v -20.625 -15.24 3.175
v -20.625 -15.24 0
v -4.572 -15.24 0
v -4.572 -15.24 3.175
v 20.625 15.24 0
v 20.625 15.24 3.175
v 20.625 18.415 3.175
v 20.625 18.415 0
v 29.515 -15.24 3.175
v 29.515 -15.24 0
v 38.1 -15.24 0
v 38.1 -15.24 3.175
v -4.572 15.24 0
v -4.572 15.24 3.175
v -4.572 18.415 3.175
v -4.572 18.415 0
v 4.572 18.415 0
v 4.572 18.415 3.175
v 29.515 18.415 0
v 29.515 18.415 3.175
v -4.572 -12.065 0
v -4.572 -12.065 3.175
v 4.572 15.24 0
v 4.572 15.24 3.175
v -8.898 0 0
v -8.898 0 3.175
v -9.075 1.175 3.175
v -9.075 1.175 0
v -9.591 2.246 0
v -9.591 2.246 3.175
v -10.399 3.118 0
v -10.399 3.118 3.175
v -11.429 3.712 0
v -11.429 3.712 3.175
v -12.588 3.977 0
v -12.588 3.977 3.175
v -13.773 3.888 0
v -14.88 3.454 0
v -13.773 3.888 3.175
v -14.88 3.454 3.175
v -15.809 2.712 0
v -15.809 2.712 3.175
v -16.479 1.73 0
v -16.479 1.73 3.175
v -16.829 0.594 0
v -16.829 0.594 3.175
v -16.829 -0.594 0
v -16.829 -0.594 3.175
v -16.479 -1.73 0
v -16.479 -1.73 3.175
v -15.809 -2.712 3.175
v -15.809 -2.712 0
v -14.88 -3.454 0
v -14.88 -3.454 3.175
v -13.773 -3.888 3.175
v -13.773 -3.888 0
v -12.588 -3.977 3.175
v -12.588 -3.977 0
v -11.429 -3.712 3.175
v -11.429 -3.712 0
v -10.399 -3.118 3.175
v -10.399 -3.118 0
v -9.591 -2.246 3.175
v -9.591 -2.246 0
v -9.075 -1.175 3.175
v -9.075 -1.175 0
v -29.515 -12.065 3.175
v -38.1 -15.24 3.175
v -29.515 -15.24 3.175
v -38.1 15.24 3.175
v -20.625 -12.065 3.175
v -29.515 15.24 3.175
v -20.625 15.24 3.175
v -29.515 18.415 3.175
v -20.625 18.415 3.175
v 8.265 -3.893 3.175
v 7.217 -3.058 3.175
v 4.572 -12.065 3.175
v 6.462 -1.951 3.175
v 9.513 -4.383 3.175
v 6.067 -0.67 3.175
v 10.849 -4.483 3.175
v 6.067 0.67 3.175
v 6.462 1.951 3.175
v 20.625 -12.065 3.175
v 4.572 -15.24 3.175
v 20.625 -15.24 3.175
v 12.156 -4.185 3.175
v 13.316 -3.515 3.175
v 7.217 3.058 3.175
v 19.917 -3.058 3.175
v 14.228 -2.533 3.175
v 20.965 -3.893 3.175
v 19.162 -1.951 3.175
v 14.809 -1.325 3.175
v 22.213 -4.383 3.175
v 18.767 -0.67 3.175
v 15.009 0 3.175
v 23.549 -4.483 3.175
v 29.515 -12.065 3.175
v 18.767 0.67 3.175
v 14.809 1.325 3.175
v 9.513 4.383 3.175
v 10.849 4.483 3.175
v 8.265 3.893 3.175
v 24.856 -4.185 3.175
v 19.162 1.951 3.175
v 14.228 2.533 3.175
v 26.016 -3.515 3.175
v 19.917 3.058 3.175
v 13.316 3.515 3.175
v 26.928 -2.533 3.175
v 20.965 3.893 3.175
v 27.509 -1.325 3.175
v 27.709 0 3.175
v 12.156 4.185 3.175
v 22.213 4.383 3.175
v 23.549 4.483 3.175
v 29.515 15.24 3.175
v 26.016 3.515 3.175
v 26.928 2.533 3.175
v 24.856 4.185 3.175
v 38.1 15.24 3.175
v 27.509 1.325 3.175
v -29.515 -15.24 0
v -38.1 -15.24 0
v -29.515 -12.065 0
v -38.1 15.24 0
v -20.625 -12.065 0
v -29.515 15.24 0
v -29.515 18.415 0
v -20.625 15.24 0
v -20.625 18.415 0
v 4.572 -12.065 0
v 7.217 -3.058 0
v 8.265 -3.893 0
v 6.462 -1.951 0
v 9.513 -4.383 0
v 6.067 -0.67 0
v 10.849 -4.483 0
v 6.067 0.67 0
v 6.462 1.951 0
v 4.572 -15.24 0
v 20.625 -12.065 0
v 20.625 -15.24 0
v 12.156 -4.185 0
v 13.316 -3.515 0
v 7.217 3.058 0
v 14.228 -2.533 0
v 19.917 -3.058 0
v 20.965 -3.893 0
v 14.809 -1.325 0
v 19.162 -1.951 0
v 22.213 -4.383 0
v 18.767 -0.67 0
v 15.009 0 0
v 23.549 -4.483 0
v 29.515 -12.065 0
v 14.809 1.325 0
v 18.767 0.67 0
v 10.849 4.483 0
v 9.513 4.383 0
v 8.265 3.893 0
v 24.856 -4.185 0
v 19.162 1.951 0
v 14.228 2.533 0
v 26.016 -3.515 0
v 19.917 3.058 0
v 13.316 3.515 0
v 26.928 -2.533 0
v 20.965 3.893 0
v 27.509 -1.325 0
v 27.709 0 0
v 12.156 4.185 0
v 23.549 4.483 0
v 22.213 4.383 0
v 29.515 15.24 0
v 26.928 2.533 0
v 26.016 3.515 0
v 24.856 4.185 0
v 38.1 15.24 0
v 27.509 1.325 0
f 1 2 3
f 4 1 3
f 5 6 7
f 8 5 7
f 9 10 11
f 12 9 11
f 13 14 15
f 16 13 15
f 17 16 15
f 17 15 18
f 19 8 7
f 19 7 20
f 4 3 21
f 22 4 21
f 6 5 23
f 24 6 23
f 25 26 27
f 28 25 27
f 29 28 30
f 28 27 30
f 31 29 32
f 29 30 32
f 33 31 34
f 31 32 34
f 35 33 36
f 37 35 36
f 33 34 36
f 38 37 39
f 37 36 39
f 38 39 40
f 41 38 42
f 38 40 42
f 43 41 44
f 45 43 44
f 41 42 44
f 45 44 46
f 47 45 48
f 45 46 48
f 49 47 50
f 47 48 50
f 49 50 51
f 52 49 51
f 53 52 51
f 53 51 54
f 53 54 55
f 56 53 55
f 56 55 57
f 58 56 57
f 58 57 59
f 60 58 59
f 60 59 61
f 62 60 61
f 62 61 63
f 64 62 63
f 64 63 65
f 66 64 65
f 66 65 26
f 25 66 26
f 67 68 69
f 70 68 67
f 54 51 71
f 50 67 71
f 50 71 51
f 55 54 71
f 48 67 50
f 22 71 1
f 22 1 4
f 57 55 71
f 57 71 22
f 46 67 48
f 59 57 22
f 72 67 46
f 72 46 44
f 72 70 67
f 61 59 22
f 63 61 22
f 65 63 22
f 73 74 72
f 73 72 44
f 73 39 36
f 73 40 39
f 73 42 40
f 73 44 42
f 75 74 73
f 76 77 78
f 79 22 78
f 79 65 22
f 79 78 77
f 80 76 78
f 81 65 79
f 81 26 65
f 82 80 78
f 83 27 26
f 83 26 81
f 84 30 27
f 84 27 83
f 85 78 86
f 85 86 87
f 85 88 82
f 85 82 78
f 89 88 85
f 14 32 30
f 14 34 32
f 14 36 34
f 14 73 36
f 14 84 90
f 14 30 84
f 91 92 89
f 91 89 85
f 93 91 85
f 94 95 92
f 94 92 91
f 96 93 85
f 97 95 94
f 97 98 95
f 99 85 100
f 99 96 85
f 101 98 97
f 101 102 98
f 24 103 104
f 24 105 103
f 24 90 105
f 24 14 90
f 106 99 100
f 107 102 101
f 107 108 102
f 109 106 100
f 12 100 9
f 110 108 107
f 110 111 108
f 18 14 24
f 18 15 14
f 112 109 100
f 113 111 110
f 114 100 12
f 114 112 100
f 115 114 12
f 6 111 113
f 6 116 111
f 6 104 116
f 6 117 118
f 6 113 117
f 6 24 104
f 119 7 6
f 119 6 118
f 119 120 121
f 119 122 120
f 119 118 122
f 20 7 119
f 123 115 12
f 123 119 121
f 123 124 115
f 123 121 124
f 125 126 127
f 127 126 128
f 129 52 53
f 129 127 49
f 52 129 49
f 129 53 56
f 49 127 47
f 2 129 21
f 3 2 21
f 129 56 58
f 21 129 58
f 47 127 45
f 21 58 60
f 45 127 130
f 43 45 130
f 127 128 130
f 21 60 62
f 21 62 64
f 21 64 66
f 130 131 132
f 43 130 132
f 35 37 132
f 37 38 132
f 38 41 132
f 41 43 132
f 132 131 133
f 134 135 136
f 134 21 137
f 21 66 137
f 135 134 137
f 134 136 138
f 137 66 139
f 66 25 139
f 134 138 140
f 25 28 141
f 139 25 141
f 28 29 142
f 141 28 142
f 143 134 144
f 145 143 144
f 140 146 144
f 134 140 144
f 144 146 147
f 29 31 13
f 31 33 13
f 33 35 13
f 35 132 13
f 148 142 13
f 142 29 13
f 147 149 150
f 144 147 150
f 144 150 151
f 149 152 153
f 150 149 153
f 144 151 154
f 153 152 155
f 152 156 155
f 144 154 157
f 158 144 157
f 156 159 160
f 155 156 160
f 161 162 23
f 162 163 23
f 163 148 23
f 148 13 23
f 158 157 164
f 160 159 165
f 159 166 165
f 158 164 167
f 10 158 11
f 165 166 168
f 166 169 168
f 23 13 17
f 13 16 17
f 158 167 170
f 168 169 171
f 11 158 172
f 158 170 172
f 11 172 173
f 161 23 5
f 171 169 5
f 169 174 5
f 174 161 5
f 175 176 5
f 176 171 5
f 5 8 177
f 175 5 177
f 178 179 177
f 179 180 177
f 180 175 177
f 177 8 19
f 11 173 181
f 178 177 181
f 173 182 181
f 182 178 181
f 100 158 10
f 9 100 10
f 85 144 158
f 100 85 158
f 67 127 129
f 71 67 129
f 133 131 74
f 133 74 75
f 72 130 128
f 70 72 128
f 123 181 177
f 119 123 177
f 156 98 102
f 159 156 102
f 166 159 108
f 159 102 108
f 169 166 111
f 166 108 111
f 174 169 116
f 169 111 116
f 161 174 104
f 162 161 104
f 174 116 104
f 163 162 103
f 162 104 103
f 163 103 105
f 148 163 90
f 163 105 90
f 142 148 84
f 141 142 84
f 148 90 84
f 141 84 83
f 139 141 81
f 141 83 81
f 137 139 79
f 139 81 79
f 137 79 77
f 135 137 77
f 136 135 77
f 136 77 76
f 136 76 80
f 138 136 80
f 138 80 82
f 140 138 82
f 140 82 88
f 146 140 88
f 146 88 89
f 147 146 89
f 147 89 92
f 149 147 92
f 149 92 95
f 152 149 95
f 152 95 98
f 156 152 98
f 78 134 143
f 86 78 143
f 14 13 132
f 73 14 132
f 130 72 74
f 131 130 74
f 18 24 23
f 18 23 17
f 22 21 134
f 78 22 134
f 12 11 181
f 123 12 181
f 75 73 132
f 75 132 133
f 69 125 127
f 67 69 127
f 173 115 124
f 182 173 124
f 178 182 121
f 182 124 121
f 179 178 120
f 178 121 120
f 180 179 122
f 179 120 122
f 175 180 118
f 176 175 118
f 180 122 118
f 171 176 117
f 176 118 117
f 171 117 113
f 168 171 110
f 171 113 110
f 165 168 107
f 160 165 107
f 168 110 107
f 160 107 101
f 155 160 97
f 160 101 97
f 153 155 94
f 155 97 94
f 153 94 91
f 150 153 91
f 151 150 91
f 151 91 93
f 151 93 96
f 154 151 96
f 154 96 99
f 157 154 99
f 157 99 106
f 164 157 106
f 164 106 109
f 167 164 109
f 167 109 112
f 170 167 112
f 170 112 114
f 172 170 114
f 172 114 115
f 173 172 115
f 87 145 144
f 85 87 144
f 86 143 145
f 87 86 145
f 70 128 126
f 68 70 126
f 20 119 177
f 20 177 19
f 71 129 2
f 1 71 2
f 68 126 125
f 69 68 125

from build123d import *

# Parameters (mm, degrees)
F0_W     = 8.89
F0_H     = 3.175
F0_W_2   = 9.144
F1_DEPTH = 3.175
F2_R     = 3.9878
F2_R_2   = 4.4958
F3_DEPTH = 25.4


with BuildPart() as f1:
    # F0 (on Top) → F1 (new body)
    with BuildSketch(Plane.XY):
        with Locations((-25.0698, 16.8275)):
            Rectangle(F0_W, F0_H)
        Polygon((-29.5148, 15.24), (-38.1, 15.24), (-38.1, -15.24), (-29.5148, -15.24), (-29.5148, -12.065), (-20.6248, -12.065), (-20.6248, -15.24), (-4.572, -15.24), (-4.572, -12.065), (4.572, -12.065), (4.572, -15.24), (20.6248, -15.24), (20.6248, -12.065), (29.5148, -12.065), (29.5148, -15.24), (38.1, -15.24), (38.1, 15.24), (29.5148, 15.24), (20.6248, 15.24), (4.572, 15.24), (-4.572, 15.24), (-20.6248, 15.24), align=None)
        with Locations((0, 16.8275)):
            Rectangle(F0_W_2, F0_H)
        with Locations((25.0698, 16.8275)):
            Rectangle(F0_W, F0_H)
    extrude(amount=F1_DEPTH)

    # F2 (on face) → F3 (cut)
    with BuildSketch(Plane.XY.offset(3.175)):
        with Locations((-12.8858196329, 0)):
            Circle(F2_R)
        with Locations((10.5130393058, 0)):
            Circle(F2_R_2)
        with Locations((23.2130393058, 0)):
            Circle(F2_R_2)
    extrude(amount=-F3_DEPTH, mode=Mode.SUBTRACT)


solid = f1.part
